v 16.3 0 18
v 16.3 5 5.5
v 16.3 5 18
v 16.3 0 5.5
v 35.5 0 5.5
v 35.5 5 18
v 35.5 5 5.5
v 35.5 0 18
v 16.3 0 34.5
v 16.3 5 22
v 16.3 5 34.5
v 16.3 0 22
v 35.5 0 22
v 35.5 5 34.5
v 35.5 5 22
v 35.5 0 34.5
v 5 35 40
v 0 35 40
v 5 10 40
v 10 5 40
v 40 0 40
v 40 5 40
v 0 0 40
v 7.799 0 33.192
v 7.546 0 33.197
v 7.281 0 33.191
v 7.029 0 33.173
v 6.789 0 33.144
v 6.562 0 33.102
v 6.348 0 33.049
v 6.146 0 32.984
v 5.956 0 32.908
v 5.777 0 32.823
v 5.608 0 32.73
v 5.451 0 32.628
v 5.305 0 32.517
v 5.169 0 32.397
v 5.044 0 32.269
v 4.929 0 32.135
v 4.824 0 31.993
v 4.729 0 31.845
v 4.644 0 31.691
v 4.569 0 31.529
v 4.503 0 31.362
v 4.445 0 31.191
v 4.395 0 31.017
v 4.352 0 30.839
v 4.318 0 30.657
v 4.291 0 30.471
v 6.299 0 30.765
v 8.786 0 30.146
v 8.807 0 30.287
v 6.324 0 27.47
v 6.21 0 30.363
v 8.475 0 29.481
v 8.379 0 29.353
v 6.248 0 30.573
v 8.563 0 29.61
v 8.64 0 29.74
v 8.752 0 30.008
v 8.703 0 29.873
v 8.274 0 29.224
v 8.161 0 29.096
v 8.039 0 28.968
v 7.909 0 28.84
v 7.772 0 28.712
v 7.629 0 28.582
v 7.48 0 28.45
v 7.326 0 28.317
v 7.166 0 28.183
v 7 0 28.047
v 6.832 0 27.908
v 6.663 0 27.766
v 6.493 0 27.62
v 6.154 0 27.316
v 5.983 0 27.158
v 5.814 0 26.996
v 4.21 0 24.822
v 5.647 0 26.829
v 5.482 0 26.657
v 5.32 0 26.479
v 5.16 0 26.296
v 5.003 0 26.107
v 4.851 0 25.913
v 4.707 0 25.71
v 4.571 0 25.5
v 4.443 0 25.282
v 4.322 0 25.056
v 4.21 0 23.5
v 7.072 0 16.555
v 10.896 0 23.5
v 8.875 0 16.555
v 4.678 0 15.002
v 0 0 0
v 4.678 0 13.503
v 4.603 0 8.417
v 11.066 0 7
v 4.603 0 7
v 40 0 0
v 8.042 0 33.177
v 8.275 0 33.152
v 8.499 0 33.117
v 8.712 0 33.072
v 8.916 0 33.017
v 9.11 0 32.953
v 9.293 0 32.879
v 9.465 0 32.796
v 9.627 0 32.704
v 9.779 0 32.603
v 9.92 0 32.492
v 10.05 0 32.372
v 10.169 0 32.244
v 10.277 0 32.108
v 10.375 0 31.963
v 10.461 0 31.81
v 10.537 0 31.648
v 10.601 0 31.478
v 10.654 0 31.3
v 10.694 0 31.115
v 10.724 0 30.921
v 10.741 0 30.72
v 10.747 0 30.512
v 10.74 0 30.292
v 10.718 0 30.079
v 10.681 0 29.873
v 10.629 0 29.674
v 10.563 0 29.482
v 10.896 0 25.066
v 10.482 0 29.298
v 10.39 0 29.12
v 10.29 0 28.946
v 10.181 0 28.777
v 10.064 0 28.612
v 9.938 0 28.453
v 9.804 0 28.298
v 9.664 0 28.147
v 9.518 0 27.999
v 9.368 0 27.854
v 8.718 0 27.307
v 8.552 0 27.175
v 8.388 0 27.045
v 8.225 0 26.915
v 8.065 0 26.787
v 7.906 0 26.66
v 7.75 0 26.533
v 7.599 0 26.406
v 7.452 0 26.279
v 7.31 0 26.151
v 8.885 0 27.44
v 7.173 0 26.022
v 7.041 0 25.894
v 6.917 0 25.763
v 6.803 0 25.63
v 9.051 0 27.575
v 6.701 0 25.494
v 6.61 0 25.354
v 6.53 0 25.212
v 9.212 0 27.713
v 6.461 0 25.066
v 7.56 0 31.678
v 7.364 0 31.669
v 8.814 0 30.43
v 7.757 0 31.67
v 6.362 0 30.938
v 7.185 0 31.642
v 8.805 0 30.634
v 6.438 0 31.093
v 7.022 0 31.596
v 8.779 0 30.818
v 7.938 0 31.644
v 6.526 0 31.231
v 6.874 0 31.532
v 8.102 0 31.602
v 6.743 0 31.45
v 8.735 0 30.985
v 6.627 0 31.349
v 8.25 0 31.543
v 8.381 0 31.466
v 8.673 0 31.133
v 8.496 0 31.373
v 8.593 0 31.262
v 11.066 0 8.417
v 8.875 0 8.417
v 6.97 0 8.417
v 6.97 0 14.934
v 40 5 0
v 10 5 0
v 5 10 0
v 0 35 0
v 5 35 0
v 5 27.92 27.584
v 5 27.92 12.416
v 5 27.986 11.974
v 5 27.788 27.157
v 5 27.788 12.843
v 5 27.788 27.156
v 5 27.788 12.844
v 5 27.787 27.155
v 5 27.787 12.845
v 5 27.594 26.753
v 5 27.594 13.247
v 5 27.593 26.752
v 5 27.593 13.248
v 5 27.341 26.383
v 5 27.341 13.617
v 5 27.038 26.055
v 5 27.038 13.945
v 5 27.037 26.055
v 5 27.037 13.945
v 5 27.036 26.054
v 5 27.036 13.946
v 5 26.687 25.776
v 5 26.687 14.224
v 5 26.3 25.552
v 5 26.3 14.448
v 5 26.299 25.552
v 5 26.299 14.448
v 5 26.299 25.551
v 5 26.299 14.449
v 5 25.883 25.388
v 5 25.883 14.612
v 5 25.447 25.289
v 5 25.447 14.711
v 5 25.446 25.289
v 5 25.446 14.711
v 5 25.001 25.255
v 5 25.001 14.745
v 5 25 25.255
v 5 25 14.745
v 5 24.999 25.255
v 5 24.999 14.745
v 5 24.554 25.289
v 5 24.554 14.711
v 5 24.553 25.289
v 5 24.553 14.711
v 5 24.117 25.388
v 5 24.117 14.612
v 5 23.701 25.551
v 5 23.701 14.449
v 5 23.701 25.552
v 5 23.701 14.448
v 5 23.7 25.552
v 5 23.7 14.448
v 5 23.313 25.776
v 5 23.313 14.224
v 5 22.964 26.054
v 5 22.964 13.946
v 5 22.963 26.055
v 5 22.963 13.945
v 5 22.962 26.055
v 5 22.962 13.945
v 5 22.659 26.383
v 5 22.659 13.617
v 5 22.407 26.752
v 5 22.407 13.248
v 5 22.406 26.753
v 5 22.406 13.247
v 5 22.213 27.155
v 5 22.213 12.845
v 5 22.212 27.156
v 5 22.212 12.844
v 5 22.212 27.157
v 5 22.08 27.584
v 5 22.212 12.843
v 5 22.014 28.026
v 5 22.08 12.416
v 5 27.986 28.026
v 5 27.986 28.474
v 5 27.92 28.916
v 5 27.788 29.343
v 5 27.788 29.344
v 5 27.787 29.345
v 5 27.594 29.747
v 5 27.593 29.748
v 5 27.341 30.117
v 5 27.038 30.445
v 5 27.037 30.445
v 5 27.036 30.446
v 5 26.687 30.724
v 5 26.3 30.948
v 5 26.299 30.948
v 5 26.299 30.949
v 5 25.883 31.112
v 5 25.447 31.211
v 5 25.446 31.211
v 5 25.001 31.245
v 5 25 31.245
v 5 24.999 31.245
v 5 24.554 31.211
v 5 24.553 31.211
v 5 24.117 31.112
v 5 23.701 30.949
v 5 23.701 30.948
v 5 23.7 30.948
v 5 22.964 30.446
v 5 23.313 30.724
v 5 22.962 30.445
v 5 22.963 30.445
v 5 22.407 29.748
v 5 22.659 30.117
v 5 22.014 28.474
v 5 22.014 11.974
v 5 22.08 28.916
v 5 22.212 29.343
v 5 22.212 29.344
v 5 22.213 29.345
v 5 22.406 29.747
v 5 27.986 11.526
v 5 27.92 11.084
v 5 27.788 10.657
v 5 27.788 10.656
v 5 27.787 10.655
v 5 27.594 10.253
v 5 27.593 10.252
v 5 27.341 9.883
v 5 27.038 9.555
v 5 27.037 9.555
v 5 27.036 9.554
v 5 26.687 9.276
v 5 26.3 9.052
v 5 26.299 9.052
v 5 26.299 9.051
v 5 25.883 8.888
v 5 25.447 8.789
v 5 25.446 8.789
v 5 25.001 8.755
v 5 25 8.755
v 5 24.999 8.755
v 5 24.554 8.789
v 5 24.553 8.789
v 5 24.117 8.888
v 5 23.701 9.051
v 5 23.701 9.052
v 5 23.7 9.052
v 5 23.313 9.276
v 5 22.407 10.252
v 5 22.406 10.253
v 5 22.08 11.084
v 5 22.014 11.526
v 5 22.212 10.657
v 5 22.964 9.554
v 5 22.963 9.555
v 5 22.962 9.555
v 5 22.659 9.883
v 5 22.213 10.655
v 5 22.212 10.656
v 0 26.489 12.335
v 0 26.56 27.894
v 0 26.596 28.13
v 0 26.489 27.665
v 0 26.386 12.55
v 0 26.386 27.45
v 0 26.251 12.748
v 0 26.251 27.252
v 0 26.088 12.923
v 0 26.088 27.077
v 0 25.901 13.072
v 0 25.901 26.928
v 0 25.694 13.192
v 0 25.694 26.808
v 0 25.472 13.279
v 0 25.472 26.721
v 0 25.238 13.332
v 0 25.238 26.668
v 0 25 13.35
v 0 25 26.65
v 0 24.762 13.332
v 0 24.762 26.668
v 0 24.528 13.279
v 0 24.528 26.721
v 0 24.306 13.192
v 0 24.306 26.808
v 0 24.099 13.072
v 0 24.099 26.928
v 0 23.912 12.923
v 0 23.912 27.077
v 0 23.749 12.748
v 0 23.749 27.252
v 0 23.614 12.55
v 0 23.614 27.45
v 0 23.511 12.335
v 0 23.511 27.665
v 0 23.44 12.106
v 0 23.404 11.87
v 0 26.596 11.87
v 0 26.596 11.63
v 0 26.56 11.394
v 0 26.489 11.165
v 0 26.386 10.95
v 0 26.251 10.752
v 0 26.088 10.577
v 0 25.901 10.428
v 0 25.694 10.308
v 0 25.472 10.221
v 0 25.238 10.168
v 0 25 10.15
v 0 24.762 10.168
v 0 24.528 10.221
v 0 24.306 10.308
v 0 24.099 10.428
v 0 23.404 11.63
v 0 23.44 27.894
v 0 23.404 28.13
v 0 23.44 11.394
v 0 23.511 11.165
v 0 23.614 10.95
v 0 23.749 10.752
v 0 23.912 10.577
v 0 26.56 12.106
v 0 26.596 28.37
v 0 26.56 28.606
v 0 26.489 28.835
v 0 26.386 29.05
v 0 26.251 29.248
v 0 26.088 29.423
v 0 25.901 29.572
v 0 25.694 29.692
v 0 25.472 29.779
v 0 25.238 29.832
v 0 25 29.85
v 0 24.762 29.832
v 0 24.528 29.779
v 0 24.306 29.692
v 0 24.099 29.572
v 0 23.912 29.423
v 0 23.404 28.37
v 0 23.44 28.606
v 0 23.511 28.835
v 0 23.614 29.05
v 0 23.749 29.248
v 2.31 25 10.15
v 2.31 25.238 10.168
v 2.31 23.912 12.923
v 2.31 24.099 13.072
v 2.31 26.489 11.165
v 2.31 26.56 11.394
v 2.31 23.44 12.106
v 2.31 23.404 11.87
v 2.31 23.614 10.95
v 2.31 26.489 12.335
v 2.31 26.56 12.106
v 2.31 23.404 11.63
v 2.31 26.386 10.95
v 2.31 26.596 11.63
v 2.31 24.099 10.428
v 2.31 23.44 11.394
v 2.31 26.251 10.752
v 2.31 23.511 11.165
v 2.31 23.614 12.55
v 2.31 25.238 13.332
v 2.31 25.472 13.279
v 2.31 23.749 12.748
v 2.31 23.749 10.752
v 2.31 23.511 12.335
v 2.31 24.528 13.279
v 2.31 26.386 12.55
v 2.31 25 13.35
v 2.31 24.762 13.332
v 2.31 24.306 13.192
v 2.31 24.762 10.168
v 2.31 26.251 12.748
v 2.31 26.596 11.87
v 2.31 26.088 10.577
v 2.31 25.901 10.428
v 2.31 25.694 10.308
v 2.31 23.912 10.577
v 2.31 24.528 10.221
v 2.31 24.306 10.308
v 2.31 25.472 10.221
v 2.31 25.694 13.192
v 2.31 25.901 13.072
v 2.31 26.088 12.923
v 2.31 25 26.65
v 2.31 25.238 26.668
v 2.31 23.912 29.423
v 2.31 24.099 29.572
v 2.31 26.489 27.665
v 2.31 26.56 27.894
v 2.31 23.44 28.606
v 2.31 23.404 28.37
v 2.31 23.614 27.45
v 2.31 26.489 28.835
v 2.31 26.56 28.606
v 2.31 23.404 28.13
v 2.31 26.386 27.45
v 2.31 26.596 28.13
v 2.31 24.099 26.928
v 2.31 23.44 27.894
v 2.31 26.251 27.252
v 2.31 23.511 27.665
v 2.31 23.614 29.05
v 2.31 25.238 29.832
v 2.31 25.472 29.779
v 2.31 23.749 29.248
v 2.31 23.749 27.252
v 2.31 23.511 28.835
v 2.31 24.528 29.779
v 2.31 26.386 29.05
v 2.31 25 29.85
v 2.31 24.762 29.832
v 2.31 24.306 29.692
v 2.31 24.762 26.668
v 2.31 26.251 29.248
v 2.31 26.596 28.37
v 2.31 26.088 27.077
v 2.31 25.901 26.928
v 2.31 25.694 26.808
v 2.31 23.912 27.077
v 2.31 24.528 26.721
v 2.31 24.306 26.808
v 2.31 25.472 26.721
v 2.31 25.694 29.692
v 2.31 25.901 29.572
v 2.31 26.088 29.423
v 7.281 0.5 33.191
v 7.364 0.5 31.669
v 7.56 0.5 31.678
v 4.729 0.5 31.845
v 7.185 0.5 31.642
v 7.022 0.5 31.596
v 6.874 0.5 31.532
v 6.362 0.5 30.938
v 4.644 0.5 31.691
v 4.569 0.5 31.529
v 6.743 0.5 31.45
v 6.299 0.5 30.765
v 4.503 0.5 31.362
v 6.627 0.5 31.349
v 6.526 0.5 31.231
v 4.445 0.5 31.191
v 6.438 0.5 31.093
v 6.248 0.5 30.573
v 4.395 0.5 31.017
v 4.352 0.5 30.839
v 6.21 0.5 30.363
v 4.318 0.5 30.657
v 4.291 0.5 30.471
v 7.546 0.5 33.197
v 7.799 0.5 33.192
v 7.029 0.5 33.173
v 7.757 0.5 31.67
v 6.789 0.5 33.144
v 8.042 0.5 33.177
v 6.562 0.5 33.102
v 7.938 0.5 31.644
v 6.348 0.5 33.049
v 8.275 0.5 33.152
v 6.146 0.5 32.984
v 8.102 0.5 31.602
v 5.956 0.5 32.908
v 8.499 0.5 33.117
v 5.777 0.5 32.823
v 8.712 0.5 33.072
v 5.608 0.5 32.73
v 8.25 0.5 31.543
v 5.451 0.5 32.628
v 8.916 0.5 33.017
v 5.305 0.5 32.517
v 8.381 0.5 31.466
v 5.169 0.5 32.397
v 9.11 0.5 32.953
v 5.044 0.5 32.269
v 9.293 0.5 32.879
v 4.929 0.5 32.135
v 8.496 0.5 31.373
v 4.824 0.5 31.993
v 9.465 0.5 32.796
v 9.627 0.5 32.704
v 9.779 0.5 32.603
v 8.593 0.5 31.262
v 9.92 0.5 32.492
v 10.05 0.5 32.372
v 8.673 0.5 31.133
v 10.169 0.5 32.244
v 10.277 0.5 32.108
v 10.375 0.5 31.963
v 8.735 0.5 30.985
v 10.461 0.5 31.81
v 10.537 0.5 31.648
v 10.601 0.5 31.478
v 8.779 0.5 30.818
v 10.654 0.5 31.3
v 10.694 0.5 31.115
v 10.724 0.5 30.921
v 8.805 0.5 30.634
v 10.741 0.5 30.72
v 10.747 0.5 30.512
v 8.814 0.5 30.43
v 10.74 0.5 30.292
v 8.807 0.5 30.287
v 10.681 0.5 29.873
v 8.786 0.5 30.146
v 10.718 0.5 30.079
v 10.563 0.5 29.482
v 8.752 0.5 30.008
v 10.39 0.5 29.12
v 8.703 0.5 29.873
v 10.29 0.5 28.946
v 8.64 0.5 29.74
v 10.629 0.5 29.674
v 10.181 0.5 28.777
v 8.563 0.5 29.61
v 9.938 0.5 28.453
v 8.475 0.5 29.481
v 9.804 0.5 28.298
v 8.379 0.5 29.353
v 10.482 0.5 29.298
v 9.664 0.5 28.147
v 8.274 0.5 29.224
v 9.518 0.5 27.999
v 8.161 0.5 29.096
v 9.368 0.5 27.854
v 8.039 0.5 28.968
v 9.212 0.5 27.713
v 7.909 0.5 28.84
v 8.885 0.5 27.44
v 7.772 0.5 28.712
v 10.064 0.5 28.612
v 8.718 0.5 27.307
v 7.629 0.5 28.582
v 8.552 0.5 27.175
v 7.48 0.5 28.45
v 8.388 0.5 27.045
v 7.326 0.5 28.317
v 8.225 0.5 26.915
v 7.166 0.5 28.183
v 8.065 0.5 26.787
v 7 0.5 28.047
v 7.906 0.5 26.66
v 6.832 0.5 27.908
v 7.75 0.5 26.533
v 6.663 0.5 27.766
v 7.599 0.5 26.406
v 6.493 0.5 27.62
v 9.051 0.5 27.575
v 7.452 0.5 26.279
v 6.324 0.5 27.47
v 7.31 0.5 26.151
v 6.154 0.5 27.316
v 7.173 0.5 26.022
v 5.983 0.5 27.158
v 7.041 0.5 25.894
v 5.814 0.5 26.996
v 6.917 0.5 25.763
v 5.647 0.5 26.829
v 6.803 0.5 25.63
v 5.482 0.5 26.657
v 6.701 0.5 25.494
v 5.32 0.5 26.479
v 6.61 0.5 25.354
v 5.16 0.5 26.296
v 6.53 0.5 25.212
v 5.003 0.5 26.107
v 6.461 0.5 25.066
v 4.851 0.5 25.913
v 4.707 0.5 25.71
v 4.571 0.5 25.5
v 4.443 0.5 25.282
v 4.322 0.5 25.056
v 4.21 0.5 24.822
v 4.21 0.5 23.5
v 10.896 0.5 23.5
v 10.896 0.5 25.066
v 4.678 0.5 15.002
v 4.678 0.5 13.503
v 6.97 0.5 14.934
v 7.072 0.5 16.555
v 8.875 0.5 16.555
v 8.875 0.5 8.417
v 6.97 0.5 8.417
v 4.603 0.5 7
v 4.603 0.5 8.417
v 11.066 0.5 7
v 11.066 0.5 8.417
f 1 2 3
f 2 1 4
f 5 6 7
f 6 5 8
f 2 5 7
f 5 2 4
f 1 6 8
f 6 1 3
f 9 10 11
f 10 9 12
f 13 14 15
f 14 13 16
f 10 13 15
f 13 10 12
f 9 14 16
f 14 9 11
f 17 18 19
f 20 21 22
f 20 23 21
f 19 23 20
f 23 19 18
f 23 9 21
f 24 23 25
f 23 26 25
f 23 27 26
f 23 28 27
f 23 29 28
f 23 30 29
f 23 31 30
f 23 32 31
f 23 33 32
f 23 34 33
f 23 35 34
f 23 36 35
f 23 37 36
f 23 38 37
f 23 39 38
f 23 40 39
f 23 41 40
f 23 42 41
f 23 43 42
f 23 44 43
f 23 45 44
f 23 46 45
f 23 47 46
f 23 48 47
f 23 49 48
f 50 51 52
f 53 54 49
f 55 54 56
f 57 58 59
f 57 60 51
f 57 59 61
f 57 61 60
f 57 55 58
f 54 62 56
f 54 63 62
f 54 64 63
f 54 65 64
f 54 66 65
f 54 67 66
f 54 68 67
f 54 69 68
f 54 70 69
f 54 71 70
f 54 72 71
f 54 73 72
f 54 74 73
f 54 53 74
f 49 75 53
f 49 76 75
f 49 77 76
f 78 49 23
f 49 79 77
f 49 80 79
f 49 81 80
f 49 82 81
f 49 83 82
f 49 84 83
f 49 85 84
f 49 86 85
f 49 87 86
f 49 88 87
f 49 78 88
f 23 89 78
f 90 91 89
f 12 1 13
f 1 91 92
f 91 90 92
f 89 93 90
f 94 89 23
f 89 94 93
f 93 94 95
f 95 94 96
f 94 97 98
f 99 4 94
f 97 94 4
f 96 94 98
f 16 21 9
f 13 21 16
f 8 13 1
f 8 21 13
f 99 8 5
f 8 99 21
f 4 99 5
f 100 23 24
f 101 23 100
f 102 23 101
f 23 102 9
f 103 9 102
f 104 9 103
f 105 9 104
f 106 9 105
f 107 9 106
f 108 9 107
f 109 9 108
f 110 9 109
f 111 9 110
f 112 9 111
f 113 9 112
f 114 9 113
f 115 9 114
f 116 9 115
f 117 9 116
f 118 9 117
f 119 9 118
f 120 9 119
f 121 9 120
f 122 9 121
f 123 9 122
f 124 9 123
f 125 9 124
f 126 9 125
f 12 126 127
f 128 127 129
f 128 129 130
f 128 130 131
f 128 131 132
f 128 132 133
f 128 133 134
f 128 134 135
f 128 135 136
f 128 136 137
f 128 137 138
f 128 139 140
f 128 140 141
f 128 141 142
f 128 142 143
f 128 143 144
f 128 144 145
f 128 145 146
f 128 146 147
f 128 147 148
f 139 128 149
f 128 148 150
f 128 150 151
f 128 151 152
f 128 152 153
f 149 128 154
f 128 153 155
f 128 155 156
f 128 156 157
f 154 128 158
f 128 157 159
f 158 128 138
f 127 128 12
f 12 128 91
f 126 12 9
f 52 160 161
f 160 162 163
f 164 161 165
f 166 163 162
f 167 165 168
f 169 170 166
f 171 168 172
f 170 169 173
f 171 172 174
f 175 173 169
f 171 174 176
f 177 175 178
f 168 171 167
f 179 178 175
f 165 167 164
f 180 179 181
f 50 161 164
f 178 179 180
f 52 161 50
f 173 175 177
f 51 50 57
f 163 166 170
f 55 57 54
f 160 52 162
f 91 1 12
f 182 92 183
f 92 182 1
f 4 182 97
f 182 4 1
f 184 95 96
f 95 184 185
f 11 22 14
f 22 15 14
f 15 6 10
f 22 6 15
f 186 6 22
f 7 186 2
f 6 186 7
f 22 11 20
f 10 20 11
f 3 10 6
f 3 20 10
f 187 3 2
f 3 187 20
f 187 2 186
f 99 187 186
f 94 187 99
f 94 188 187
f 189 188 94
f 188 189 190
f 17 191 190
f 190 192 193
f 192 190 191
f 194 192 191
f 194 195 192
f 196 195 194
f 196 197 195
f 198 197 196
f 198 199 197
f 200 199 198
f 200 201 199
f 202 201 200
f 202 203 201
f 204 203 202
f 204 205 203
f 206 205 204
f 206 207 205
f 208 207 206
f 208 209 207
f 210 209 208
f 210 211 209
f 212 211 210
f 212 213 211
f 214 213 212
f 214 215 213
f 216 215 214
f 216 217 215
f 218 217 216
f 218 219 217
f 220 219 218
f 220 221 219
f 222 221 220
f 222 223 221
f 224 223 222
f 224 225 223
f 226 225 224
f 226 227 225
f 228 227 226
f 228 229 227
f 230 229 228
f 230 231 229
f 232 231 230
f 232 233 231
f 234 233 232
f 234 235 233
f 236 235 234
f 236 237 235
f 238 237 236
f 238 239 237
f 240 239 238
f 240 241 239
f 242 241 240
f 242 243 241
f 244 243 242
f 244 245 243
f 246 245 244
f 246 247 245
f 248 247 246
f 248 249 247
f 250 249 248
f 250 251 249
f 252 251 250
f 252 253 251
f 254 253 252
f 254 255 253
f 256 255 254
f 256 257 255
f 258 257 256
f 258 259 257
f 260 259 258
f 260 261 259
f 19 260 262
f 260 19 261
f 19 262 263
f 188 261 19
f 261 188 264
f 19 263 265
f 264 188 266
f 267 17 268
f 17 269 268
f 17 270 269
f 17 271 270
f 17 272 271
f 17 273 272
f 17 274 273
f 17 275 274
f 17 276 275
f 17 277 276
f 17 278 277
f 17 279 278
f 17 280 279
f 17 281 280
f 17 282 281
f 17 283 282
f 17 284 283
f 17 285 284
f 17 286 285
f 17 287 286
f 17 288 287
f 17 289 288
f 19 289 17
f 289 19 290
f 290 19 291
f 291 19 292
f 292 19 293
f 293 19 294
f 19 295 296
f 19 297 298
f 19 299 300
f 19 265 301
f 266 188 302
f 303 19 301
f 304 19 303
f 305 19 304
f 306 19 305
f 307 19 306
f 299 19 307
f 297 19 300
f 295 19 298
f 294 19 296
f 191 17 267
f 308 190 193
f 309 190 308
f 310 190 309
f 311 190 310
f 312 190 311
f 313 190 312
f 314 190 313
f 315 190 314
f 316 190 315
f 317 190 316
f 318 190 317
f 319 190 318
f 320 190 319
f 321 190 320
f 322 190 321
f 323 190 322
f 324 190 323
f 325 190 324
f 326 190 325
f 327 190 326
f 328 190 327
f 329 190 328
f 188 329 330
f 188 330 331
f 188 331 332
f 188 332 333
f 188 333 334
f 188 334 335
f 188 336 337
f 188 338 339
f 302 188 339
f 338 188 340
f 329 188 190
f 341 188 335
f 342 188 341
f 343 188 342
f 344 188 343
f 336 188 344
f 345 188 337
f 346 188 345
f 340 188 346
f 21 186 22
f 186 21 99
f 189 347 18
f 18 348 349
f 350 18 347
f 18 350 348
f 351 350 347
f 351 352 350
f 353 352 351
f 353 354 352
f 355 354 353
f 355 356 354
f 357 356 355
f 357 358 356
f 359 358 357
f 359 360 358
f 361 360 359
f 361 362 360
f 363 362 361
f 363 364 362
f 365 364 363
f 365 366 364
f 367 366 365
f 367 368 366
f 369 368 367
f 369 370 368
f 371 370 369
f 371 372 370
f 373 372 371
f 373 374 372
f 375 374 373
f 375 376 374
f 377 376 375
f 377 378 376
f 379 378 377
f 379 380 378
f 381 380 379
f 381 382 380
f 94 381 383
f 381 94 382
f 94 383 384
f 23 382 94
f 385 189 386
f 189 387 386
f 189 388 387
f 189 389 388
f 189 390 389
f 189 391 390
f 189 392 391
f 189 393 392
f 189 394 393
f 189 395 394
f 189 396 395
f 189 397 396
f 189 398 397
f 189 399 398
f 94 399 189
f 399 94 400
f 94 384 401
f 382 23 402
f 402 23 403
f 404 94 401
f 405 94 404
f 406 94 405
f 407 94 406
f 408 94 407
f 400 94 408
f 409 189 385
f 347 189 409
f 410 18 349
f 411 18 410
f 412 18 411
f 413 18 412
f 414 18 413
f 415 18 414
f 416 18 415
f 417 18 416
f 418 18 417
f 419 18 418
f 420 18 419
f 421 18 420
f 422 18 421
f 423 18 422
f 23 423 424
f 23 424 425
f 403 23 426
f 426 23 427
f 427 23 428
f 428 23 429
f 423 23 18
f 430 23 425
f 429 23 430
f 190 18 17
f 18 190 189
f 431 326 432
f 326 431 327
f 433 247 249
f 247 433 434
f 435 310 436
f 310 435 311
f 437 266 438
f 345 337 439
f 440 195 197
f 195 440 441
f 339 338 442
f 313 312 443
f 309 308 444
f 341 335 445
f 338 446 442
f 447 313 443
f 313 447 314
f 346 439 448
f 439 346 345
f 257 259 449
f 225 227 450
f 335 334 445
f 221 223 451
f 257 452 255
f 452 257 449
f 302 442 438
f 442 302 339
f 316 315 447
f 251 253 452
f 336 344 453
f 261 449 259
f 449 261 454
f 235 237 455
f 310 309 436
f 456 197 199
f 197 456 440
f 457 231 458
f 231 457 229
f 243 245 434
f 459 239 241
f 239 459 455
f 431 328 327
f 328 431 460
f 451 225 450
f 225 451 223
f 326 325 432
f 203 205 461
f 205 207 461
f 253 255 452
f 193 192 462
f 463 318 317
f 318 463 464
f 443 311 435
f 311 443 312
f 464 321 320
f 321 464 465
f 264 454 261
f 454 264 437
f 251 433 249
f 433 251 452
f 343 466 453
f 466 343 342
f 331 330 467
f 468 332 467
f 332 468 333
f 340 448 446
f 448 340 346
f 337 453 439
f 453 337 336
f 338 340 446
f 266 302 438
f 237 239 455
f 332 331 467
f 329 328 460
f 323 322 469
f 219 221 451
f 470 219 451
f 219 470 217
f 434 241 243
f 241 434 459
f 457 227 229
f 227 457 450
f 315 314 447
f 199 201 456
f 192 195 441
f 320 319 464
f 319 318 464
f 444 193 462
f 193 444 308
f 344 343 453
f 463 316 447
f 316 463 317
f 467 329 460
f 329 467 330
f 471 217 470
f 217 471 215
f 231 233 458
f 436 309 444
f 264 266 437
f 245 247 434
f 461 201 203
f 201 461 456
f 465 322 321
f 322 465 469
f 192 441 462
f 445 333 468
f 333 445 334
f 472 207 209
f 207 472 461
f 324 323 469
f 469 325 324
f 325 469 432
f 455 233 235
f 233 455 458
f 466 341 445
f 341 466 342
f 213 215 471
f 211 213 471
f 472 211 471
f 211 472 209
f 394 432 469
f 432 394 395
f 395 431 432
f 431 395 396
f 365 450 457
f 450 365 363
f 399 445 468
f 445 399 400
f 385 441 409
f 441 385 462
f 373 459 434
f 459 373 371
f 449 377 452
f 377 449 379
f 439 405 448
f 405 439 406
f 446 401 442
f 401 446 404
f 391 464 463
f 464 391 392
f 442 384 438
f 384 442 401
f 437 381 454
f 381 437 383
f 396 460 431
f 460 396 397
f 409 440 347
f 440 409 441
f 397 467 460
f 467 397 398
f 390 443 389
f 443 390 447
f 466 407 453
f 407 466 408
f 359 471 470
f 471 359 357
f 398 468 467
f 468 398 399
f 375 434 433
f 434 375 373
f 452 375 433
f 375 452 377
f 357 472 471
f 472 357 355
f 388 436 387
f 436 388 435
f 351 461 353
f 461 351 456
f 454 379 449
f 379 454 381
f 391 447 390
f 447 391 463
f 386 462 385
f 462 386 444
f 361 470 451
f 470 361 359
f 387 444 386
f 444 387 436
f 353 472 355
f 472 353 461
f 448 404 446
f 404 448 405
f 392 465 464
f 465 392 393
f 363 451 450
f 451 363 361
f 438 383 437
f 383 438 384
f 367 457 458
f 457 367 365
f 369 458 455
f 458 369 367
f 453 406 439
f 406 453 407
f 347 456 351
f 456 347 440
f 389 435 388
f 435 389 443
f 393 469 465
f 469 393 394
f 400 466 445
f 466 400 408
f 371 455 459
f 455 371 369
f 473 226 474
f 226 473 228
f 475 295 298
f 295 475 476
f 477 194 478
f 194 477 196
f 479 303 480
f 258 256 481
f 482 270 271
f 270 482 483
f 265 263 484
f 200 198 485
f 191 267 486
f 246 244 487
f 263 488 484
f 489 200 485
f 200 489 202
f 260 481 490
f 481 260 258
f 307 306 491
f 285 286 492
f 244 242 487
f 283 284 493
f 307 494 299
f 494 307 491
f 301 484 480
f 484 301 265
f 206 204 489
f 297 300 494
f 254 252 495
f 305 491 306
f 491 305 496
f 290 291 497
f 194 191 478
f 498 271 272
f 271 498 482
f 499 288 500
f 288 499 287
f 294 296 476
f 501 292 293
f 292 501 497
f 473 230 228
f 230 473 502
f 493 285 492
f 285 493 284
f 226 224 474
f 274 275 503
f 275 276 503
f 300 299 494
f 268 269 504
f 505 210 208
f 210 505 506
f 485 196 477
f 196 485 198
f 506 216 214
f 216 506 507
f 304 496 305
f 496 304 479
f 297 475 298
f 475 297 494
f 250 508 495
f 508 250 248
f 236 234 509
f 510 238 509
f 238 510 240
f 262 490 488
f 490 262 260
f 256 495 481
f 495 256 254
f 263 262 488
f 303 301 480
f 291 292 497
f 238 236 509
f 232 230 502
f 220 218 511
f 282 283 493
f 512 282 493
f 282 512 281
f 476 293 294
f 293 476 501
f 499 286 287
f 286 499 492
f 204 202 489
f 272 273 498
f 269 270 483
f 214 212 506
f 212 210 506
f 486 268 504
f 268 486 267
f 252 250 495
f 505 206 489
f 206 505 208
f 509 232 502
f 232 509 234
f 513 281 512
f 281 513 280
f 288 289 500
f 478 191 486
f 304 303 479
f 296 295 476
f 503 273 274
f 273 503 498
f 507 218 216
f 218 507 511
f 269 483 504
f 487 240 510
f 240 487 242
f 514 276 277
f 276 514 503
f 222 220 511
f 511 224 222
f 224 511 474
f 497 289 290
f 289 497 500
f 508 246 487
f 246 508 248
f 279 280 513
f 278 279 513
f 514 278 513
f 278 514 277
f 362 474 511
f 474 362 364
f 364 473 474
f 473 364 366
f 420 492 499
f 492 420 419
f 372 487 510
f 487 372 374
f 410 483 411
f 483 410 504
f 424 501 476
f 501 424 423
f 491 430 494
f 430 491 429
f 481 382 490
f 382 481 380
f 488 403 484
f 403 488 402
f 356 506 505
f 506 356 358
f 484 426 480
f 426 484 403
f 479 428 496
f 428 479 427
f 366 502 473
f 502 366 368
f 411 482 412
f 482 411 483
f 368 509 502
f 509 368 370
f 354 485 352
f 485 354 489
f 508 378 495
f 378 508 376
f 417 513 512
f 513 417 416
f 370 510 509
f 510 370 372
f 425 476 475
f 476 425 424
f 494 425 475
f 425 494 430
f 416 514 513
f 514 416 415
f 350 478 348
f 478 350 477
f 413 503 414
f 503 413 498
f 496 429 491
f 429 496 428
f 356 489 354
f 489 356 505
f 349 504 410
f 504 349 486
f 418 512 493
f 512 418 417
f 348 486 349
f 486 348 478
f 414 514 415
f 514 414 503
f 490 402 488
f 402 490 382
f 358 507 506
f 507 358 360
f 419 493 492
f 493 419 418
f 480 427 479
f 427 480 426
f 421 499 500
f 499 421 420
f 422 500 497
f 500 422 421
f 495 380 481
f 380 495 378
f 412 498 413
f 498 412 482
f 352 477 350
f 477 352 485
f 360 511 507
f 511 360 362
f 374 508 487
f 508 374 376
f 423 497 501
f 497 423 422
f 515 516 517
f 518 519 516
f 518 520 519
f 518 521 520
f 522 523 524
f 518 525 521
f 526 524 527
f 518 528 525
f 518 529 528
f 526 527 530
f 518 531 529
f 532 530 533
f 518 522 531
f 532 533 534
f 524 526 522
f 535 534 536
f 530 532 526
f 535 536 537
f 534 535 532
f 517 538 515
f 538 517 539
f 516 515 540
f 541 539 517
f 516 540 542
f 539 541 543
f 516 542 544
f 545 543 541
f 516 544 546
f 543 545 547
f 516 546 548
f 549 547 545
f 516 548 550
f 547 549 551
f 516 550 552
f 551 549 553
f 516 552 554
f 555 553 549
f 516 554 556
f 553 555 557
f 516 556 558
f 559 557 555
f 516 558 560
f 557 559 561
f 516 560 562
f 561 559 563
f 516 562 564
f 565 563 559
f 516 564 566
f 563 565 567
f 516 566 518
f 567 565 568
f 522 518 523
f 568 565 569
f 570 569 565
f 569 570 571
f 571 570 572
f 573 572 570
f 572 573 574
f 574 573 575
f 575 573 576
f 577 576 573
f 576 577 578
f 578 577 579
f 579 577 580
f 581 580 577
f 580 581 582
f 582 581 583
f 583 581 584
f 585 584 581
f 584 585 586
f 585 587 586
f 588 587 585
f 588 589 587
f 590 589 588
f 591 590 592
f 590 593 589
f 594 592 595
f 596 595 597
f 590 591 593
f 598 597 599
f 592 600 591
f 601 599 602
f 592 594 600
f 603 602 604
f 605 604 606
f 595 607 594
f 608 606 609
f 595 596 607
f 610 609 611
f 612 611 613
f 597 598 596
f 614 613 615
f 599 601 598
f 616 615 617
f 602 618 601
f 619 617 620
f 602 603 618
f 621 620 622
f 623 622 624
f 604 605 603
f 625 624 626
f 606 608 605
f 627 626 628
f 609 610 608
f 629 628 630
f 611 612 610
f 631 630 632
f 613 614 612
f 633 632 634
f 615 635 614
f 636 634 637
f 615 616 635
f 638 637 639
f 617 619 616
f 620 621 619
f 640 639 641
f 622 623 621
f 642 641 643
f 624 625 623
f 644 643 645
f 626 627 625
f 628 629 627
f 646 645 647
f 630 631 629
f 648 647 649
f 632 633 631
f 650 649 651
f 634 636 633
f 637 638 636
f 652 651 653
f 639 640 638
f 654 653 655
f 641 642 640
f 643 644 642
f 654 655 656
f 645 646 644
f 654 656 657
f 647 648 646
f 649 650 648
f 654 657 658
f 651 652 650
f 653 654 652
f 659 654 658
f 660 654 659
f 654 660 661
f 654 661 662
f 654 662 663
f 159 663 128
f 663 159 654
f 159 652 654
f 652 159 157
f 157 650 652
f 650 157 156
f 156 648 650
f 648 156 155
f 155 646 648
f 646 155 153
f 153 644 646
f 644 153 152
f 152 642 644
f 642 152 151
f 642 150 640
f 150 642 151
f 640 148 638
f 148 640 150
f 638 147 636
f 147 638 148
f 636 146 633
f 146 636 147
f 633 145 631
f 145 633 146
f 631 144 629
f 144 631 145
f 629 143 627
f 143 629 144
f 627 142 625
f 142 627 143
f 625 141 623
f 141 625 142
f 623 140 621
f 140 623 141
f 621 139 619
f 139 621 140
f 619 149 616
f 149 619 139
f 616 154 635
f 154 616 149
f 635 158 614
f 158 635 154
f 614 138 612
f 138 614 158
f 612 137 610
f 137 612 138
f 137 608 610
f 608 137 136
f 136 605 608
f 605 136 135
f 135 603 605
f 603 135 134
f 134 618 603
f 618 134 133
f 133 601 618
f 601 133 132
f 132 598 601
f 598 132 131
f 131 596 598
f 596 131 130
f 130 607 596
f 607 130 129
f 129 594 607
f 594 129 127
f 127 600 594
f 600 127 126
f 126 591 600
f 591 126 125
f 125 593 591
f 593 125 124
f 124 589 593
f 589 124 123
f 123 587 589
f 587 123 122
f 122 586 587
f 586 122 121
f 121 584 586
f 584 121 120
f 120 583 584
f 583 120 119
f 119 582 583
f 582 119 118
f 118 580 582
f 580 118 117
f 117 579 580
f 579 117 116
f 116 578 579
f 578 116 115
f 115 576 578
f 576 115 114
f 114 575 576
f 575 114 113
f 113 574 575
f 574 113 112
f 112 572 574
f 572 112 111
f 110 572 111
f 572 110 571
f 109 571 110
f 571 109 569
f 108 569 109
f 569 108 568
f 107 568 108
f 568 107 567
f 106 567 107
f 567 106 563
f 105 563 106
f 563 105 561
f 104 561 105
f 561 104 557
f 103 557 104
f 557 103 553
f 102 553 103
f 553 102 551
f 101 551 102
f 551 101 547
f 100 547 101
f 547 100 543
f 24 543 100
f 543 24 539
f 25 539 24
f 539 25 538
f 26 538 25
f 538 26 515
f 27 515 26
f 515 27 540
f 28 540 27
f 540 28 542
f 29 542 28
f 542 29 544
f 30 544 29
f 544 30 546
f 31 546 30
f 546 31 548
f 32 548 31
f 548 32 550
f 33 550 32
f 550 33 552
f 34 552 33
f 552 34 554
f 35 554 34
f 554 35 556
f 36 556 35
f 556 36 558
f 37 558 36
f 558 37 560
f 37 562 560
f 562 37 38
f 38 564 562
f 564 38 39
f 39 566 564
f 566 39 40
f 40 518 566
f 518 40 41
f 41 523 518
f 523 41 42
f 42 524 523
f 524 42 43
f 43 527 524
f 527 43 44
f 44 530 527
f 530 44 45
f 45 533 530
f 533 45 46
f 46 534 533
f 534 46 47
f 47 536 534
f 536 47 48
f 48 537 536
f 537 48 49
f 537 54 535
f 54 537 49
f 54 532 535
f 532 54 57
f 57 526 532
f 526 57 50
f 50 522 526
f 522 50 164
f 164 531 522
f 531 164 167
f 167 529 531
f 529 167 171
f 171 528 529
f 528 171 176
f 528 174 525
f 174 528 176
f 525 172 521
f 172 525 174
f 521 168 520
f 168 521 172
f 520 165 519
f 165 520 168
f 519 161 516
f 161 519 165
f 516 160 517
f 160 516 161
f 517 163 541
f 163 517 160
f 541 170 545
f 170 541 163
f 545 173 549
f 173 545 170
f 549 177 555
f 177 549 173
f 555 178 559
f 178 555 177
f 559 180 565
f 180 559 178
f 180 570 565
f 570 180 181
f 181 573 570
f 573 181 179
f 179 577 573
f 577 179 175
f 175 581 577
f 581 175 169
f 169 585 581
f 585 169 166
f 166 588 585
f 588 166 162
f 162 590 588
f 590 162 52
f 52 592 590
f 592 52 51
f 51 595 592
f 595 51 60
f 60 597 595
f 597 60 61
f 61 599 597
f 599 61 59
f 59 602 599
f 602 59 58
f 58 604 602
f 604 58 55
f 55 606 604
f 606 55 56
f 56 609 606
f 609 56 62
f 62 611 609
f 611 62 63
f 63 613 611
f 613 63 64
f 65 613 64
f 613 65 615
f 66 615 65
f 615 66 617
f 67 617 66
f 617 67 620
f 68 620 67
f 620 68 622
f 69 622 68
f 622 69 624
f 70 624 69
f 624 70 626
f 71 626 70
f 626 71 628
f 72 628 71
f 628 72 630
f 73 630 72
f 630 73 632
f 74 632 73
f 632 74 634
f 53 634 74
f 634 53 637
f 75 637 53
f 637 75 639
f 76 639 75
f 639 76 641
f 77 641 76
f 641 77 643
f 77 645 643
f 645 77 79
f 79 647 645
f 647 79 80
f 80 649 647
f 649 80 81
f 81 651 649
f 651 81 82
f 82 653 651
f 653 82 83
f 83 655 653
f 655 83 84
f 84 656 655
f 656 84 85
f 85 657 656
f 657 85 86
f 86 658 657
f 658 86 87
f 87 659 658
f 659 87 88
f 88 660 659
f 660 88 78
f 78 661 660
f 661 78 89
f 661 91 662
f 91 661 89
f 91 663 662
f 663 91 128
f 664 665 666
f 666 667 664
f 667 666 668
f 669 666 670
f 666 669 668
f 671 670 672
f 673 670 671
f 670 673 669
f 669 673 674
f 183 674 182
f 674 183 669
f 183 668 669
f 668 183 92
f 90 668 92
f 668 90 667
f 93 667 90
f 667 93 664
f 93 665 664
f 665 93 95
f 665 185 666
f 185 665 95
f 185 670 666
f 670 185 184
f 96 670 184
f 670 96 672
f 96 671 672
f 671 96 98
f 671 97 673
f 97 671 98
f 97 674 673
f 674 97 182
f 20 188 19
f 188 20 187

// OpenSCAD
mount_width = 40;
mount_height = 35;
mount_wall_depth = 30;
head_dia = 6.0;
head_height = 2.7;
hole_dia = 3.2;
hole_off = 10;
wall = 5;
switch_off = 5;
switch_height_off = 5;
prism_w = 5;

switch_width = 18.2;
switch_depth = 11.5;
switch_height = 11.0;
switch_top_width = 20.8;
switch_top_depth = 14.8;
switch_top_height = 2.1;
switch_add_negative = 1.0;

text_top = "2";
text_bottom = "1";
text_font = "Liberation Sans:style=Bold";
text_h = 10;
text_d = 0.5;
text_spacing = 1.0;
text_off = 7.5;
text_top_off = 6;
text_bottom_off = 10.5;

$fn = 42;

switches_width = switch_depth * 2 + switch_off;

module screw(h) {
    translate([0, 0, h - head_height])
    cylinder(d1 = hole_dia, d2 = head_dia, h = head_height);
    
    cylinder(d = hole_dia, h = h - head_height + 0.01);
}

module prism(l, w, h) {
    polyhedron(
        points = [[0,0,0], [l,0,0], [l,w,0], [0,w,0], [0,w,h], [l,w,h]],
        faces = [[0,1,2,3],[5,4,3,2],[0,4,5,1],[0,3,4],[5,2,1]]
    );
}

module switch(s = 0) {
    translate([-s / 2, -s / 2, s - switch_height])
    cube([switch_width + s, switch_depth + s, switch_height]);
    
    translate([-(switch_top_width - switch_width) / 2, -(switch_top_depth - switch_depth) / 2, s])
    cube([switch_top_width, switch_top_depth, switch_top_height]);
}

module light_switches() {
    difference() {
        cube([mount_width, mount_height, wall]);
    
        for (i = [0, switch_off + switch_depth]) {
            translate([i + switch_depth + (mount_width - switches_width) / 2, switch_height_off, wall])
            rotate([0, 0, 90])
            switch(switch_add_negative);
        }
    }
    
    for (i = [0, switch_off + switch_depth]) {
        %translate([i + switch_depth + (mount_width - switches_width) / 2, switch_height_off, wall])
        rotate([0, 0, 90])
        switch();
    }
}

module mount() {
    
    difference() {
        union() {
            cube([wall, wall + mount_wall_depth, mount_width]);
            
            translate([mount_height + wall, wall, 0])
            rotate([90, -90, 0])
            light_switches();
        }
        
        for (i = [0, switch_depth + switch_off]) {
            translate([-0.01, wall + mount_wall_depth - hole_off, switch_depth + (mount_width - switches_width) / 2 - switch_depth / 2 + i])
            rotate([0, 90, 0])
            screw(wall + 0.02);
        }
        
        translate([text_off, text_d, switch_depth + (mount_width - switches_width) / 2 + text_top_off])
        rotate([90, 0, 0])
        linear_extrude(height = text_d + 0.1)
        text(text_top, font = text_font, size = text_h, spacing = text_spacing, halign = "center");
        
        translate([text_off, text_d, switch_depth + (mount_width - switches_width) / 2 - text_bottom_off])
        rotate([90, 0, 0])
        linear_extrude(height = text_d + 0.1)
        text(text_bottom, font = text_font, size = text_h, spacing = text_spacing, halign = "center");
    }
    
    translate([wall, wall + prism_w, 0])
    rotate([0, -90, 180])
    prism(mount_width, prism_w, prism_w);
}

mount();
